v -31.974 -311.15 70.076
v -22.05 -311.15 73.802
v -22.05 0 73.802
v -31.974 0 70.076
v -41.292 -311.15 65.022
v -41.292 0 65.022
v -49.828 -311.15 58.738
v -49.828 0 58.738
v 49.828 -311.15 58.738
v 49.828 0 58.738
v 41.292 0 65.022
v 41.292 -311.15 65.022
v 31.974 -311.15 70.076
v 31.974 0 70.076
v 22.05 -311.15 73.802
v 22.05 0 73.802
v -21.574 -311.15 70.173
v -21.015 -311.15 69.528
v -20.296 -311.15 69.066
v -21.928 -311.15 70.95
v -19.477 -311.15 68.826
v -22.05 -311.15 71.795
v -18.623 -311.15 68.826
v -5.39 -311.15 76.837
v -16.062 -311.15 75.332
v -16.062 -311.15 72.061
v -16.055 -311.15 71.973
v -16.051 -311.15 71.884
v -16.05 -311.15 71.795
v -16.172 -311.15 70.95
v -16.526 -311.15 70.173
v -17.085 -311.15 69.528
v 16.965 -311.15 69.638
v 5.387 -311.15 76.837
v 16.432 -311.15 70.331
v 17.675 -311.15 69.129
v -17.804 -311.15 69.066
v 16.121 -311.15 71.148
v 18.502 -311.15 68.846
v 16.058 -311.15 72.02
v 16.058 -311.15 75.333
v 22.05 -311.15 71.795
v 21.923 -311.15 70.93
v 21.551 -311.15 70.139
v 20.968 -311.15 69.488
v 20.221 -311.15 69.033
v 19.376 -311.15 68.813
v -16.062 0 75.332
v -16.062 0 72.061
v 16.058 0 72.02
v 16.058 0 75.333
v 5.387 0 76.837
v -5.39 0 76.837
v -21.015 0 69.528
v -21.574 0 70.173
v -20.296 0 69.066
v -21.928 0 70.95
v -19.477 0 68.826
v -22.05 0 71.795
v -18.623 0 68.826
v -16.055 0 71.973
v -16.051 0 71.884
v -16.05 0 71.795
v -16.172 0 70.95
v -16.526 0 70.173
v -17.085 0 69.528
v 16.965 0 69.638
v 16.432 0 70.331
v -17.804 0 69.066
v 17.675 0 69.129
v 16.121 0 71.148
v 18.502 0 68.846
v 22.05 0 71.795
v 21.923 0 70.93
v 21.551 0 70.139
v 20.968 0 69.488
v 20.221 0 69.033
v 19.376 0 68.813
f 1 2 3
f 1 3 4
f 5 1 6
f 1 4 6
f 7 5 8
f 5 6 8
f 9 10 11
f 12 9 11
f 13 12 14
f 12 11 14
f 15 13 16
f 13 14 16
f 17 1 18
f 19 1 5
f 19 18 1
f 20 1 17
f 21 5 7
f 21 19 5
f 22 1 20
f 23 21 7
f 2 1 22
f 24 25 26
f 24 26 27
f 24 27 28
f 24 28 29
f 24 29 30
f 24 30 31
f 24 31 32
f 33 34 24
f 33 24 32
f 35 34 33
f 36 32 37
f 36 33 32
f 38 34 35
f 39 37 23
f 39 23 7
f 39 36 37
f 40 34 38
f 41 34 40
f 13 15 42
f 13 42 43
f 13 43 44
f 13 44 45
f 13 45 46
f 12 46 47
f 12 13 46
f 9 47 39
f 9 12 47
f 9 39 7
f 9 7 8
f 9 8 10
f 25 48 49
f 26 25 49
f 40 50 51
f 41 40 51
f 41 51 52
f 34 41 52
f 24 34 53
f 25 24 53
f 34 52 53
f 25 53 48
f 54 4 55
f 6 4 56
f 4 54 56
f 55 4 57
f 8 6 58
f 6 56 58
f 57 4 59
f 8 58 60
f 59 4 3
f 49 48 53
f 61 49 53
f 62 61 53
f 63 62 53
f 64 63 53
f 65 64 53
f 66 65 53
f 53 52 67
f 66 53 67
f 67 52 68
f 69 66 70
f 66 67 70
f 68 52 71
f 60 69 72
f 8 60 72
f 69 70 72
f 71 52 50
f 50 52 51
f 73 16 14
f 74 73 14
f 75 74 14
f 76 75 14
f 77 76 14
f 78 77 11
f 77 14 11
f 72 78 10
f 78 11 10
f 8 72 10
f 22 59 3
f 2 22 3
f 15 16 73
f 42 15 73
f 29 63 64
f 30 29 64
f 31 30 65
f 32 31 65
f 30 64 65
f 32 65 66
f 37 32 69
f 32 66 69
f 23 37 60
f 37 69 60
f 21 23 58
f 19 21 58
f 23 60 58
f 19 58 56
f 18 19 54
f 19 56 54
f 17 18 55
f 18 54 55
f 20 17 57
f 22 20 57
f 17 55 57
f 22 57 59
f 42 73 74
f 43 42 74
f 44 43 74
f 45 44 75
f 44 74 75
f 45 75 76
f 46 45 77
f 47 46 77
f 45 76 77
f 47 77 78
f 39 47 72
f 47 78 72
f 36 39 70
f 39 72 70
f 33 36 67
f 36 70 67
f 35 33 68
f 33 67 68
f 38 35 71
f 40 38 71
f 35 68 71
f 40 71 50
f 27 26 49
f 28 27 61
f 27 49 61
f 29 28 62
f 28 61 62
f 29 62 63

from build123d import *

# Parameters (mm, degrees)
F1_DEPTH = 311.15


with BuildPart() as f1:
    # F0 (on Front) → F1 (new body)
    with BuildSketch(Plane.XZ):
        with BuildLine():
            Line((-49.8280417436, 58.7375), (49.8280417436, 58.7375))
            ThreePointArc((49.8280417436, 58.7375), (36.7198515553, 67.7095277786), (22.05, 73.801931887))
            Line((22.05, 73.801931887), (22.05, 71.7951364665))
            ThreePointArc((22.05, 71.7951364665), (18.9376310607, 68.7972416683), (16.0584178523, 72.0197166389))
            Line((16.0584178523, 72.0197166389), (16.0584178523, 75.3329600263))
            ThreePointArc((16.0584178523, 75.3329600263), (-0.00173326, 77.0254999805), (-16.0618081837, 75.3322372436))
            Line((-16.0618081837, 75.3322372436), (-16.0618081837, 72.0610493636))
            ThreePointArc((-16.0618081837, 72.0610493636), (-16.0529534998, 71.9282239397), (-16.05, 71.7951364665))
            ThreePointArc((-16.05, 71.7951364665), (-19.05, 68.7951364665), (-22.05, 71.7951364665))
            Line((-22.05, 71.7951364665), (-22.05, 73.801931887))
            ThreePointArc((-22.05, 73.801931887), (-36.7198515553, 67.7095277787), (-49.8280417436, 58.7375))
        make_face()
    extrude(amount=F1_DEPTH)


solid = f1.part
